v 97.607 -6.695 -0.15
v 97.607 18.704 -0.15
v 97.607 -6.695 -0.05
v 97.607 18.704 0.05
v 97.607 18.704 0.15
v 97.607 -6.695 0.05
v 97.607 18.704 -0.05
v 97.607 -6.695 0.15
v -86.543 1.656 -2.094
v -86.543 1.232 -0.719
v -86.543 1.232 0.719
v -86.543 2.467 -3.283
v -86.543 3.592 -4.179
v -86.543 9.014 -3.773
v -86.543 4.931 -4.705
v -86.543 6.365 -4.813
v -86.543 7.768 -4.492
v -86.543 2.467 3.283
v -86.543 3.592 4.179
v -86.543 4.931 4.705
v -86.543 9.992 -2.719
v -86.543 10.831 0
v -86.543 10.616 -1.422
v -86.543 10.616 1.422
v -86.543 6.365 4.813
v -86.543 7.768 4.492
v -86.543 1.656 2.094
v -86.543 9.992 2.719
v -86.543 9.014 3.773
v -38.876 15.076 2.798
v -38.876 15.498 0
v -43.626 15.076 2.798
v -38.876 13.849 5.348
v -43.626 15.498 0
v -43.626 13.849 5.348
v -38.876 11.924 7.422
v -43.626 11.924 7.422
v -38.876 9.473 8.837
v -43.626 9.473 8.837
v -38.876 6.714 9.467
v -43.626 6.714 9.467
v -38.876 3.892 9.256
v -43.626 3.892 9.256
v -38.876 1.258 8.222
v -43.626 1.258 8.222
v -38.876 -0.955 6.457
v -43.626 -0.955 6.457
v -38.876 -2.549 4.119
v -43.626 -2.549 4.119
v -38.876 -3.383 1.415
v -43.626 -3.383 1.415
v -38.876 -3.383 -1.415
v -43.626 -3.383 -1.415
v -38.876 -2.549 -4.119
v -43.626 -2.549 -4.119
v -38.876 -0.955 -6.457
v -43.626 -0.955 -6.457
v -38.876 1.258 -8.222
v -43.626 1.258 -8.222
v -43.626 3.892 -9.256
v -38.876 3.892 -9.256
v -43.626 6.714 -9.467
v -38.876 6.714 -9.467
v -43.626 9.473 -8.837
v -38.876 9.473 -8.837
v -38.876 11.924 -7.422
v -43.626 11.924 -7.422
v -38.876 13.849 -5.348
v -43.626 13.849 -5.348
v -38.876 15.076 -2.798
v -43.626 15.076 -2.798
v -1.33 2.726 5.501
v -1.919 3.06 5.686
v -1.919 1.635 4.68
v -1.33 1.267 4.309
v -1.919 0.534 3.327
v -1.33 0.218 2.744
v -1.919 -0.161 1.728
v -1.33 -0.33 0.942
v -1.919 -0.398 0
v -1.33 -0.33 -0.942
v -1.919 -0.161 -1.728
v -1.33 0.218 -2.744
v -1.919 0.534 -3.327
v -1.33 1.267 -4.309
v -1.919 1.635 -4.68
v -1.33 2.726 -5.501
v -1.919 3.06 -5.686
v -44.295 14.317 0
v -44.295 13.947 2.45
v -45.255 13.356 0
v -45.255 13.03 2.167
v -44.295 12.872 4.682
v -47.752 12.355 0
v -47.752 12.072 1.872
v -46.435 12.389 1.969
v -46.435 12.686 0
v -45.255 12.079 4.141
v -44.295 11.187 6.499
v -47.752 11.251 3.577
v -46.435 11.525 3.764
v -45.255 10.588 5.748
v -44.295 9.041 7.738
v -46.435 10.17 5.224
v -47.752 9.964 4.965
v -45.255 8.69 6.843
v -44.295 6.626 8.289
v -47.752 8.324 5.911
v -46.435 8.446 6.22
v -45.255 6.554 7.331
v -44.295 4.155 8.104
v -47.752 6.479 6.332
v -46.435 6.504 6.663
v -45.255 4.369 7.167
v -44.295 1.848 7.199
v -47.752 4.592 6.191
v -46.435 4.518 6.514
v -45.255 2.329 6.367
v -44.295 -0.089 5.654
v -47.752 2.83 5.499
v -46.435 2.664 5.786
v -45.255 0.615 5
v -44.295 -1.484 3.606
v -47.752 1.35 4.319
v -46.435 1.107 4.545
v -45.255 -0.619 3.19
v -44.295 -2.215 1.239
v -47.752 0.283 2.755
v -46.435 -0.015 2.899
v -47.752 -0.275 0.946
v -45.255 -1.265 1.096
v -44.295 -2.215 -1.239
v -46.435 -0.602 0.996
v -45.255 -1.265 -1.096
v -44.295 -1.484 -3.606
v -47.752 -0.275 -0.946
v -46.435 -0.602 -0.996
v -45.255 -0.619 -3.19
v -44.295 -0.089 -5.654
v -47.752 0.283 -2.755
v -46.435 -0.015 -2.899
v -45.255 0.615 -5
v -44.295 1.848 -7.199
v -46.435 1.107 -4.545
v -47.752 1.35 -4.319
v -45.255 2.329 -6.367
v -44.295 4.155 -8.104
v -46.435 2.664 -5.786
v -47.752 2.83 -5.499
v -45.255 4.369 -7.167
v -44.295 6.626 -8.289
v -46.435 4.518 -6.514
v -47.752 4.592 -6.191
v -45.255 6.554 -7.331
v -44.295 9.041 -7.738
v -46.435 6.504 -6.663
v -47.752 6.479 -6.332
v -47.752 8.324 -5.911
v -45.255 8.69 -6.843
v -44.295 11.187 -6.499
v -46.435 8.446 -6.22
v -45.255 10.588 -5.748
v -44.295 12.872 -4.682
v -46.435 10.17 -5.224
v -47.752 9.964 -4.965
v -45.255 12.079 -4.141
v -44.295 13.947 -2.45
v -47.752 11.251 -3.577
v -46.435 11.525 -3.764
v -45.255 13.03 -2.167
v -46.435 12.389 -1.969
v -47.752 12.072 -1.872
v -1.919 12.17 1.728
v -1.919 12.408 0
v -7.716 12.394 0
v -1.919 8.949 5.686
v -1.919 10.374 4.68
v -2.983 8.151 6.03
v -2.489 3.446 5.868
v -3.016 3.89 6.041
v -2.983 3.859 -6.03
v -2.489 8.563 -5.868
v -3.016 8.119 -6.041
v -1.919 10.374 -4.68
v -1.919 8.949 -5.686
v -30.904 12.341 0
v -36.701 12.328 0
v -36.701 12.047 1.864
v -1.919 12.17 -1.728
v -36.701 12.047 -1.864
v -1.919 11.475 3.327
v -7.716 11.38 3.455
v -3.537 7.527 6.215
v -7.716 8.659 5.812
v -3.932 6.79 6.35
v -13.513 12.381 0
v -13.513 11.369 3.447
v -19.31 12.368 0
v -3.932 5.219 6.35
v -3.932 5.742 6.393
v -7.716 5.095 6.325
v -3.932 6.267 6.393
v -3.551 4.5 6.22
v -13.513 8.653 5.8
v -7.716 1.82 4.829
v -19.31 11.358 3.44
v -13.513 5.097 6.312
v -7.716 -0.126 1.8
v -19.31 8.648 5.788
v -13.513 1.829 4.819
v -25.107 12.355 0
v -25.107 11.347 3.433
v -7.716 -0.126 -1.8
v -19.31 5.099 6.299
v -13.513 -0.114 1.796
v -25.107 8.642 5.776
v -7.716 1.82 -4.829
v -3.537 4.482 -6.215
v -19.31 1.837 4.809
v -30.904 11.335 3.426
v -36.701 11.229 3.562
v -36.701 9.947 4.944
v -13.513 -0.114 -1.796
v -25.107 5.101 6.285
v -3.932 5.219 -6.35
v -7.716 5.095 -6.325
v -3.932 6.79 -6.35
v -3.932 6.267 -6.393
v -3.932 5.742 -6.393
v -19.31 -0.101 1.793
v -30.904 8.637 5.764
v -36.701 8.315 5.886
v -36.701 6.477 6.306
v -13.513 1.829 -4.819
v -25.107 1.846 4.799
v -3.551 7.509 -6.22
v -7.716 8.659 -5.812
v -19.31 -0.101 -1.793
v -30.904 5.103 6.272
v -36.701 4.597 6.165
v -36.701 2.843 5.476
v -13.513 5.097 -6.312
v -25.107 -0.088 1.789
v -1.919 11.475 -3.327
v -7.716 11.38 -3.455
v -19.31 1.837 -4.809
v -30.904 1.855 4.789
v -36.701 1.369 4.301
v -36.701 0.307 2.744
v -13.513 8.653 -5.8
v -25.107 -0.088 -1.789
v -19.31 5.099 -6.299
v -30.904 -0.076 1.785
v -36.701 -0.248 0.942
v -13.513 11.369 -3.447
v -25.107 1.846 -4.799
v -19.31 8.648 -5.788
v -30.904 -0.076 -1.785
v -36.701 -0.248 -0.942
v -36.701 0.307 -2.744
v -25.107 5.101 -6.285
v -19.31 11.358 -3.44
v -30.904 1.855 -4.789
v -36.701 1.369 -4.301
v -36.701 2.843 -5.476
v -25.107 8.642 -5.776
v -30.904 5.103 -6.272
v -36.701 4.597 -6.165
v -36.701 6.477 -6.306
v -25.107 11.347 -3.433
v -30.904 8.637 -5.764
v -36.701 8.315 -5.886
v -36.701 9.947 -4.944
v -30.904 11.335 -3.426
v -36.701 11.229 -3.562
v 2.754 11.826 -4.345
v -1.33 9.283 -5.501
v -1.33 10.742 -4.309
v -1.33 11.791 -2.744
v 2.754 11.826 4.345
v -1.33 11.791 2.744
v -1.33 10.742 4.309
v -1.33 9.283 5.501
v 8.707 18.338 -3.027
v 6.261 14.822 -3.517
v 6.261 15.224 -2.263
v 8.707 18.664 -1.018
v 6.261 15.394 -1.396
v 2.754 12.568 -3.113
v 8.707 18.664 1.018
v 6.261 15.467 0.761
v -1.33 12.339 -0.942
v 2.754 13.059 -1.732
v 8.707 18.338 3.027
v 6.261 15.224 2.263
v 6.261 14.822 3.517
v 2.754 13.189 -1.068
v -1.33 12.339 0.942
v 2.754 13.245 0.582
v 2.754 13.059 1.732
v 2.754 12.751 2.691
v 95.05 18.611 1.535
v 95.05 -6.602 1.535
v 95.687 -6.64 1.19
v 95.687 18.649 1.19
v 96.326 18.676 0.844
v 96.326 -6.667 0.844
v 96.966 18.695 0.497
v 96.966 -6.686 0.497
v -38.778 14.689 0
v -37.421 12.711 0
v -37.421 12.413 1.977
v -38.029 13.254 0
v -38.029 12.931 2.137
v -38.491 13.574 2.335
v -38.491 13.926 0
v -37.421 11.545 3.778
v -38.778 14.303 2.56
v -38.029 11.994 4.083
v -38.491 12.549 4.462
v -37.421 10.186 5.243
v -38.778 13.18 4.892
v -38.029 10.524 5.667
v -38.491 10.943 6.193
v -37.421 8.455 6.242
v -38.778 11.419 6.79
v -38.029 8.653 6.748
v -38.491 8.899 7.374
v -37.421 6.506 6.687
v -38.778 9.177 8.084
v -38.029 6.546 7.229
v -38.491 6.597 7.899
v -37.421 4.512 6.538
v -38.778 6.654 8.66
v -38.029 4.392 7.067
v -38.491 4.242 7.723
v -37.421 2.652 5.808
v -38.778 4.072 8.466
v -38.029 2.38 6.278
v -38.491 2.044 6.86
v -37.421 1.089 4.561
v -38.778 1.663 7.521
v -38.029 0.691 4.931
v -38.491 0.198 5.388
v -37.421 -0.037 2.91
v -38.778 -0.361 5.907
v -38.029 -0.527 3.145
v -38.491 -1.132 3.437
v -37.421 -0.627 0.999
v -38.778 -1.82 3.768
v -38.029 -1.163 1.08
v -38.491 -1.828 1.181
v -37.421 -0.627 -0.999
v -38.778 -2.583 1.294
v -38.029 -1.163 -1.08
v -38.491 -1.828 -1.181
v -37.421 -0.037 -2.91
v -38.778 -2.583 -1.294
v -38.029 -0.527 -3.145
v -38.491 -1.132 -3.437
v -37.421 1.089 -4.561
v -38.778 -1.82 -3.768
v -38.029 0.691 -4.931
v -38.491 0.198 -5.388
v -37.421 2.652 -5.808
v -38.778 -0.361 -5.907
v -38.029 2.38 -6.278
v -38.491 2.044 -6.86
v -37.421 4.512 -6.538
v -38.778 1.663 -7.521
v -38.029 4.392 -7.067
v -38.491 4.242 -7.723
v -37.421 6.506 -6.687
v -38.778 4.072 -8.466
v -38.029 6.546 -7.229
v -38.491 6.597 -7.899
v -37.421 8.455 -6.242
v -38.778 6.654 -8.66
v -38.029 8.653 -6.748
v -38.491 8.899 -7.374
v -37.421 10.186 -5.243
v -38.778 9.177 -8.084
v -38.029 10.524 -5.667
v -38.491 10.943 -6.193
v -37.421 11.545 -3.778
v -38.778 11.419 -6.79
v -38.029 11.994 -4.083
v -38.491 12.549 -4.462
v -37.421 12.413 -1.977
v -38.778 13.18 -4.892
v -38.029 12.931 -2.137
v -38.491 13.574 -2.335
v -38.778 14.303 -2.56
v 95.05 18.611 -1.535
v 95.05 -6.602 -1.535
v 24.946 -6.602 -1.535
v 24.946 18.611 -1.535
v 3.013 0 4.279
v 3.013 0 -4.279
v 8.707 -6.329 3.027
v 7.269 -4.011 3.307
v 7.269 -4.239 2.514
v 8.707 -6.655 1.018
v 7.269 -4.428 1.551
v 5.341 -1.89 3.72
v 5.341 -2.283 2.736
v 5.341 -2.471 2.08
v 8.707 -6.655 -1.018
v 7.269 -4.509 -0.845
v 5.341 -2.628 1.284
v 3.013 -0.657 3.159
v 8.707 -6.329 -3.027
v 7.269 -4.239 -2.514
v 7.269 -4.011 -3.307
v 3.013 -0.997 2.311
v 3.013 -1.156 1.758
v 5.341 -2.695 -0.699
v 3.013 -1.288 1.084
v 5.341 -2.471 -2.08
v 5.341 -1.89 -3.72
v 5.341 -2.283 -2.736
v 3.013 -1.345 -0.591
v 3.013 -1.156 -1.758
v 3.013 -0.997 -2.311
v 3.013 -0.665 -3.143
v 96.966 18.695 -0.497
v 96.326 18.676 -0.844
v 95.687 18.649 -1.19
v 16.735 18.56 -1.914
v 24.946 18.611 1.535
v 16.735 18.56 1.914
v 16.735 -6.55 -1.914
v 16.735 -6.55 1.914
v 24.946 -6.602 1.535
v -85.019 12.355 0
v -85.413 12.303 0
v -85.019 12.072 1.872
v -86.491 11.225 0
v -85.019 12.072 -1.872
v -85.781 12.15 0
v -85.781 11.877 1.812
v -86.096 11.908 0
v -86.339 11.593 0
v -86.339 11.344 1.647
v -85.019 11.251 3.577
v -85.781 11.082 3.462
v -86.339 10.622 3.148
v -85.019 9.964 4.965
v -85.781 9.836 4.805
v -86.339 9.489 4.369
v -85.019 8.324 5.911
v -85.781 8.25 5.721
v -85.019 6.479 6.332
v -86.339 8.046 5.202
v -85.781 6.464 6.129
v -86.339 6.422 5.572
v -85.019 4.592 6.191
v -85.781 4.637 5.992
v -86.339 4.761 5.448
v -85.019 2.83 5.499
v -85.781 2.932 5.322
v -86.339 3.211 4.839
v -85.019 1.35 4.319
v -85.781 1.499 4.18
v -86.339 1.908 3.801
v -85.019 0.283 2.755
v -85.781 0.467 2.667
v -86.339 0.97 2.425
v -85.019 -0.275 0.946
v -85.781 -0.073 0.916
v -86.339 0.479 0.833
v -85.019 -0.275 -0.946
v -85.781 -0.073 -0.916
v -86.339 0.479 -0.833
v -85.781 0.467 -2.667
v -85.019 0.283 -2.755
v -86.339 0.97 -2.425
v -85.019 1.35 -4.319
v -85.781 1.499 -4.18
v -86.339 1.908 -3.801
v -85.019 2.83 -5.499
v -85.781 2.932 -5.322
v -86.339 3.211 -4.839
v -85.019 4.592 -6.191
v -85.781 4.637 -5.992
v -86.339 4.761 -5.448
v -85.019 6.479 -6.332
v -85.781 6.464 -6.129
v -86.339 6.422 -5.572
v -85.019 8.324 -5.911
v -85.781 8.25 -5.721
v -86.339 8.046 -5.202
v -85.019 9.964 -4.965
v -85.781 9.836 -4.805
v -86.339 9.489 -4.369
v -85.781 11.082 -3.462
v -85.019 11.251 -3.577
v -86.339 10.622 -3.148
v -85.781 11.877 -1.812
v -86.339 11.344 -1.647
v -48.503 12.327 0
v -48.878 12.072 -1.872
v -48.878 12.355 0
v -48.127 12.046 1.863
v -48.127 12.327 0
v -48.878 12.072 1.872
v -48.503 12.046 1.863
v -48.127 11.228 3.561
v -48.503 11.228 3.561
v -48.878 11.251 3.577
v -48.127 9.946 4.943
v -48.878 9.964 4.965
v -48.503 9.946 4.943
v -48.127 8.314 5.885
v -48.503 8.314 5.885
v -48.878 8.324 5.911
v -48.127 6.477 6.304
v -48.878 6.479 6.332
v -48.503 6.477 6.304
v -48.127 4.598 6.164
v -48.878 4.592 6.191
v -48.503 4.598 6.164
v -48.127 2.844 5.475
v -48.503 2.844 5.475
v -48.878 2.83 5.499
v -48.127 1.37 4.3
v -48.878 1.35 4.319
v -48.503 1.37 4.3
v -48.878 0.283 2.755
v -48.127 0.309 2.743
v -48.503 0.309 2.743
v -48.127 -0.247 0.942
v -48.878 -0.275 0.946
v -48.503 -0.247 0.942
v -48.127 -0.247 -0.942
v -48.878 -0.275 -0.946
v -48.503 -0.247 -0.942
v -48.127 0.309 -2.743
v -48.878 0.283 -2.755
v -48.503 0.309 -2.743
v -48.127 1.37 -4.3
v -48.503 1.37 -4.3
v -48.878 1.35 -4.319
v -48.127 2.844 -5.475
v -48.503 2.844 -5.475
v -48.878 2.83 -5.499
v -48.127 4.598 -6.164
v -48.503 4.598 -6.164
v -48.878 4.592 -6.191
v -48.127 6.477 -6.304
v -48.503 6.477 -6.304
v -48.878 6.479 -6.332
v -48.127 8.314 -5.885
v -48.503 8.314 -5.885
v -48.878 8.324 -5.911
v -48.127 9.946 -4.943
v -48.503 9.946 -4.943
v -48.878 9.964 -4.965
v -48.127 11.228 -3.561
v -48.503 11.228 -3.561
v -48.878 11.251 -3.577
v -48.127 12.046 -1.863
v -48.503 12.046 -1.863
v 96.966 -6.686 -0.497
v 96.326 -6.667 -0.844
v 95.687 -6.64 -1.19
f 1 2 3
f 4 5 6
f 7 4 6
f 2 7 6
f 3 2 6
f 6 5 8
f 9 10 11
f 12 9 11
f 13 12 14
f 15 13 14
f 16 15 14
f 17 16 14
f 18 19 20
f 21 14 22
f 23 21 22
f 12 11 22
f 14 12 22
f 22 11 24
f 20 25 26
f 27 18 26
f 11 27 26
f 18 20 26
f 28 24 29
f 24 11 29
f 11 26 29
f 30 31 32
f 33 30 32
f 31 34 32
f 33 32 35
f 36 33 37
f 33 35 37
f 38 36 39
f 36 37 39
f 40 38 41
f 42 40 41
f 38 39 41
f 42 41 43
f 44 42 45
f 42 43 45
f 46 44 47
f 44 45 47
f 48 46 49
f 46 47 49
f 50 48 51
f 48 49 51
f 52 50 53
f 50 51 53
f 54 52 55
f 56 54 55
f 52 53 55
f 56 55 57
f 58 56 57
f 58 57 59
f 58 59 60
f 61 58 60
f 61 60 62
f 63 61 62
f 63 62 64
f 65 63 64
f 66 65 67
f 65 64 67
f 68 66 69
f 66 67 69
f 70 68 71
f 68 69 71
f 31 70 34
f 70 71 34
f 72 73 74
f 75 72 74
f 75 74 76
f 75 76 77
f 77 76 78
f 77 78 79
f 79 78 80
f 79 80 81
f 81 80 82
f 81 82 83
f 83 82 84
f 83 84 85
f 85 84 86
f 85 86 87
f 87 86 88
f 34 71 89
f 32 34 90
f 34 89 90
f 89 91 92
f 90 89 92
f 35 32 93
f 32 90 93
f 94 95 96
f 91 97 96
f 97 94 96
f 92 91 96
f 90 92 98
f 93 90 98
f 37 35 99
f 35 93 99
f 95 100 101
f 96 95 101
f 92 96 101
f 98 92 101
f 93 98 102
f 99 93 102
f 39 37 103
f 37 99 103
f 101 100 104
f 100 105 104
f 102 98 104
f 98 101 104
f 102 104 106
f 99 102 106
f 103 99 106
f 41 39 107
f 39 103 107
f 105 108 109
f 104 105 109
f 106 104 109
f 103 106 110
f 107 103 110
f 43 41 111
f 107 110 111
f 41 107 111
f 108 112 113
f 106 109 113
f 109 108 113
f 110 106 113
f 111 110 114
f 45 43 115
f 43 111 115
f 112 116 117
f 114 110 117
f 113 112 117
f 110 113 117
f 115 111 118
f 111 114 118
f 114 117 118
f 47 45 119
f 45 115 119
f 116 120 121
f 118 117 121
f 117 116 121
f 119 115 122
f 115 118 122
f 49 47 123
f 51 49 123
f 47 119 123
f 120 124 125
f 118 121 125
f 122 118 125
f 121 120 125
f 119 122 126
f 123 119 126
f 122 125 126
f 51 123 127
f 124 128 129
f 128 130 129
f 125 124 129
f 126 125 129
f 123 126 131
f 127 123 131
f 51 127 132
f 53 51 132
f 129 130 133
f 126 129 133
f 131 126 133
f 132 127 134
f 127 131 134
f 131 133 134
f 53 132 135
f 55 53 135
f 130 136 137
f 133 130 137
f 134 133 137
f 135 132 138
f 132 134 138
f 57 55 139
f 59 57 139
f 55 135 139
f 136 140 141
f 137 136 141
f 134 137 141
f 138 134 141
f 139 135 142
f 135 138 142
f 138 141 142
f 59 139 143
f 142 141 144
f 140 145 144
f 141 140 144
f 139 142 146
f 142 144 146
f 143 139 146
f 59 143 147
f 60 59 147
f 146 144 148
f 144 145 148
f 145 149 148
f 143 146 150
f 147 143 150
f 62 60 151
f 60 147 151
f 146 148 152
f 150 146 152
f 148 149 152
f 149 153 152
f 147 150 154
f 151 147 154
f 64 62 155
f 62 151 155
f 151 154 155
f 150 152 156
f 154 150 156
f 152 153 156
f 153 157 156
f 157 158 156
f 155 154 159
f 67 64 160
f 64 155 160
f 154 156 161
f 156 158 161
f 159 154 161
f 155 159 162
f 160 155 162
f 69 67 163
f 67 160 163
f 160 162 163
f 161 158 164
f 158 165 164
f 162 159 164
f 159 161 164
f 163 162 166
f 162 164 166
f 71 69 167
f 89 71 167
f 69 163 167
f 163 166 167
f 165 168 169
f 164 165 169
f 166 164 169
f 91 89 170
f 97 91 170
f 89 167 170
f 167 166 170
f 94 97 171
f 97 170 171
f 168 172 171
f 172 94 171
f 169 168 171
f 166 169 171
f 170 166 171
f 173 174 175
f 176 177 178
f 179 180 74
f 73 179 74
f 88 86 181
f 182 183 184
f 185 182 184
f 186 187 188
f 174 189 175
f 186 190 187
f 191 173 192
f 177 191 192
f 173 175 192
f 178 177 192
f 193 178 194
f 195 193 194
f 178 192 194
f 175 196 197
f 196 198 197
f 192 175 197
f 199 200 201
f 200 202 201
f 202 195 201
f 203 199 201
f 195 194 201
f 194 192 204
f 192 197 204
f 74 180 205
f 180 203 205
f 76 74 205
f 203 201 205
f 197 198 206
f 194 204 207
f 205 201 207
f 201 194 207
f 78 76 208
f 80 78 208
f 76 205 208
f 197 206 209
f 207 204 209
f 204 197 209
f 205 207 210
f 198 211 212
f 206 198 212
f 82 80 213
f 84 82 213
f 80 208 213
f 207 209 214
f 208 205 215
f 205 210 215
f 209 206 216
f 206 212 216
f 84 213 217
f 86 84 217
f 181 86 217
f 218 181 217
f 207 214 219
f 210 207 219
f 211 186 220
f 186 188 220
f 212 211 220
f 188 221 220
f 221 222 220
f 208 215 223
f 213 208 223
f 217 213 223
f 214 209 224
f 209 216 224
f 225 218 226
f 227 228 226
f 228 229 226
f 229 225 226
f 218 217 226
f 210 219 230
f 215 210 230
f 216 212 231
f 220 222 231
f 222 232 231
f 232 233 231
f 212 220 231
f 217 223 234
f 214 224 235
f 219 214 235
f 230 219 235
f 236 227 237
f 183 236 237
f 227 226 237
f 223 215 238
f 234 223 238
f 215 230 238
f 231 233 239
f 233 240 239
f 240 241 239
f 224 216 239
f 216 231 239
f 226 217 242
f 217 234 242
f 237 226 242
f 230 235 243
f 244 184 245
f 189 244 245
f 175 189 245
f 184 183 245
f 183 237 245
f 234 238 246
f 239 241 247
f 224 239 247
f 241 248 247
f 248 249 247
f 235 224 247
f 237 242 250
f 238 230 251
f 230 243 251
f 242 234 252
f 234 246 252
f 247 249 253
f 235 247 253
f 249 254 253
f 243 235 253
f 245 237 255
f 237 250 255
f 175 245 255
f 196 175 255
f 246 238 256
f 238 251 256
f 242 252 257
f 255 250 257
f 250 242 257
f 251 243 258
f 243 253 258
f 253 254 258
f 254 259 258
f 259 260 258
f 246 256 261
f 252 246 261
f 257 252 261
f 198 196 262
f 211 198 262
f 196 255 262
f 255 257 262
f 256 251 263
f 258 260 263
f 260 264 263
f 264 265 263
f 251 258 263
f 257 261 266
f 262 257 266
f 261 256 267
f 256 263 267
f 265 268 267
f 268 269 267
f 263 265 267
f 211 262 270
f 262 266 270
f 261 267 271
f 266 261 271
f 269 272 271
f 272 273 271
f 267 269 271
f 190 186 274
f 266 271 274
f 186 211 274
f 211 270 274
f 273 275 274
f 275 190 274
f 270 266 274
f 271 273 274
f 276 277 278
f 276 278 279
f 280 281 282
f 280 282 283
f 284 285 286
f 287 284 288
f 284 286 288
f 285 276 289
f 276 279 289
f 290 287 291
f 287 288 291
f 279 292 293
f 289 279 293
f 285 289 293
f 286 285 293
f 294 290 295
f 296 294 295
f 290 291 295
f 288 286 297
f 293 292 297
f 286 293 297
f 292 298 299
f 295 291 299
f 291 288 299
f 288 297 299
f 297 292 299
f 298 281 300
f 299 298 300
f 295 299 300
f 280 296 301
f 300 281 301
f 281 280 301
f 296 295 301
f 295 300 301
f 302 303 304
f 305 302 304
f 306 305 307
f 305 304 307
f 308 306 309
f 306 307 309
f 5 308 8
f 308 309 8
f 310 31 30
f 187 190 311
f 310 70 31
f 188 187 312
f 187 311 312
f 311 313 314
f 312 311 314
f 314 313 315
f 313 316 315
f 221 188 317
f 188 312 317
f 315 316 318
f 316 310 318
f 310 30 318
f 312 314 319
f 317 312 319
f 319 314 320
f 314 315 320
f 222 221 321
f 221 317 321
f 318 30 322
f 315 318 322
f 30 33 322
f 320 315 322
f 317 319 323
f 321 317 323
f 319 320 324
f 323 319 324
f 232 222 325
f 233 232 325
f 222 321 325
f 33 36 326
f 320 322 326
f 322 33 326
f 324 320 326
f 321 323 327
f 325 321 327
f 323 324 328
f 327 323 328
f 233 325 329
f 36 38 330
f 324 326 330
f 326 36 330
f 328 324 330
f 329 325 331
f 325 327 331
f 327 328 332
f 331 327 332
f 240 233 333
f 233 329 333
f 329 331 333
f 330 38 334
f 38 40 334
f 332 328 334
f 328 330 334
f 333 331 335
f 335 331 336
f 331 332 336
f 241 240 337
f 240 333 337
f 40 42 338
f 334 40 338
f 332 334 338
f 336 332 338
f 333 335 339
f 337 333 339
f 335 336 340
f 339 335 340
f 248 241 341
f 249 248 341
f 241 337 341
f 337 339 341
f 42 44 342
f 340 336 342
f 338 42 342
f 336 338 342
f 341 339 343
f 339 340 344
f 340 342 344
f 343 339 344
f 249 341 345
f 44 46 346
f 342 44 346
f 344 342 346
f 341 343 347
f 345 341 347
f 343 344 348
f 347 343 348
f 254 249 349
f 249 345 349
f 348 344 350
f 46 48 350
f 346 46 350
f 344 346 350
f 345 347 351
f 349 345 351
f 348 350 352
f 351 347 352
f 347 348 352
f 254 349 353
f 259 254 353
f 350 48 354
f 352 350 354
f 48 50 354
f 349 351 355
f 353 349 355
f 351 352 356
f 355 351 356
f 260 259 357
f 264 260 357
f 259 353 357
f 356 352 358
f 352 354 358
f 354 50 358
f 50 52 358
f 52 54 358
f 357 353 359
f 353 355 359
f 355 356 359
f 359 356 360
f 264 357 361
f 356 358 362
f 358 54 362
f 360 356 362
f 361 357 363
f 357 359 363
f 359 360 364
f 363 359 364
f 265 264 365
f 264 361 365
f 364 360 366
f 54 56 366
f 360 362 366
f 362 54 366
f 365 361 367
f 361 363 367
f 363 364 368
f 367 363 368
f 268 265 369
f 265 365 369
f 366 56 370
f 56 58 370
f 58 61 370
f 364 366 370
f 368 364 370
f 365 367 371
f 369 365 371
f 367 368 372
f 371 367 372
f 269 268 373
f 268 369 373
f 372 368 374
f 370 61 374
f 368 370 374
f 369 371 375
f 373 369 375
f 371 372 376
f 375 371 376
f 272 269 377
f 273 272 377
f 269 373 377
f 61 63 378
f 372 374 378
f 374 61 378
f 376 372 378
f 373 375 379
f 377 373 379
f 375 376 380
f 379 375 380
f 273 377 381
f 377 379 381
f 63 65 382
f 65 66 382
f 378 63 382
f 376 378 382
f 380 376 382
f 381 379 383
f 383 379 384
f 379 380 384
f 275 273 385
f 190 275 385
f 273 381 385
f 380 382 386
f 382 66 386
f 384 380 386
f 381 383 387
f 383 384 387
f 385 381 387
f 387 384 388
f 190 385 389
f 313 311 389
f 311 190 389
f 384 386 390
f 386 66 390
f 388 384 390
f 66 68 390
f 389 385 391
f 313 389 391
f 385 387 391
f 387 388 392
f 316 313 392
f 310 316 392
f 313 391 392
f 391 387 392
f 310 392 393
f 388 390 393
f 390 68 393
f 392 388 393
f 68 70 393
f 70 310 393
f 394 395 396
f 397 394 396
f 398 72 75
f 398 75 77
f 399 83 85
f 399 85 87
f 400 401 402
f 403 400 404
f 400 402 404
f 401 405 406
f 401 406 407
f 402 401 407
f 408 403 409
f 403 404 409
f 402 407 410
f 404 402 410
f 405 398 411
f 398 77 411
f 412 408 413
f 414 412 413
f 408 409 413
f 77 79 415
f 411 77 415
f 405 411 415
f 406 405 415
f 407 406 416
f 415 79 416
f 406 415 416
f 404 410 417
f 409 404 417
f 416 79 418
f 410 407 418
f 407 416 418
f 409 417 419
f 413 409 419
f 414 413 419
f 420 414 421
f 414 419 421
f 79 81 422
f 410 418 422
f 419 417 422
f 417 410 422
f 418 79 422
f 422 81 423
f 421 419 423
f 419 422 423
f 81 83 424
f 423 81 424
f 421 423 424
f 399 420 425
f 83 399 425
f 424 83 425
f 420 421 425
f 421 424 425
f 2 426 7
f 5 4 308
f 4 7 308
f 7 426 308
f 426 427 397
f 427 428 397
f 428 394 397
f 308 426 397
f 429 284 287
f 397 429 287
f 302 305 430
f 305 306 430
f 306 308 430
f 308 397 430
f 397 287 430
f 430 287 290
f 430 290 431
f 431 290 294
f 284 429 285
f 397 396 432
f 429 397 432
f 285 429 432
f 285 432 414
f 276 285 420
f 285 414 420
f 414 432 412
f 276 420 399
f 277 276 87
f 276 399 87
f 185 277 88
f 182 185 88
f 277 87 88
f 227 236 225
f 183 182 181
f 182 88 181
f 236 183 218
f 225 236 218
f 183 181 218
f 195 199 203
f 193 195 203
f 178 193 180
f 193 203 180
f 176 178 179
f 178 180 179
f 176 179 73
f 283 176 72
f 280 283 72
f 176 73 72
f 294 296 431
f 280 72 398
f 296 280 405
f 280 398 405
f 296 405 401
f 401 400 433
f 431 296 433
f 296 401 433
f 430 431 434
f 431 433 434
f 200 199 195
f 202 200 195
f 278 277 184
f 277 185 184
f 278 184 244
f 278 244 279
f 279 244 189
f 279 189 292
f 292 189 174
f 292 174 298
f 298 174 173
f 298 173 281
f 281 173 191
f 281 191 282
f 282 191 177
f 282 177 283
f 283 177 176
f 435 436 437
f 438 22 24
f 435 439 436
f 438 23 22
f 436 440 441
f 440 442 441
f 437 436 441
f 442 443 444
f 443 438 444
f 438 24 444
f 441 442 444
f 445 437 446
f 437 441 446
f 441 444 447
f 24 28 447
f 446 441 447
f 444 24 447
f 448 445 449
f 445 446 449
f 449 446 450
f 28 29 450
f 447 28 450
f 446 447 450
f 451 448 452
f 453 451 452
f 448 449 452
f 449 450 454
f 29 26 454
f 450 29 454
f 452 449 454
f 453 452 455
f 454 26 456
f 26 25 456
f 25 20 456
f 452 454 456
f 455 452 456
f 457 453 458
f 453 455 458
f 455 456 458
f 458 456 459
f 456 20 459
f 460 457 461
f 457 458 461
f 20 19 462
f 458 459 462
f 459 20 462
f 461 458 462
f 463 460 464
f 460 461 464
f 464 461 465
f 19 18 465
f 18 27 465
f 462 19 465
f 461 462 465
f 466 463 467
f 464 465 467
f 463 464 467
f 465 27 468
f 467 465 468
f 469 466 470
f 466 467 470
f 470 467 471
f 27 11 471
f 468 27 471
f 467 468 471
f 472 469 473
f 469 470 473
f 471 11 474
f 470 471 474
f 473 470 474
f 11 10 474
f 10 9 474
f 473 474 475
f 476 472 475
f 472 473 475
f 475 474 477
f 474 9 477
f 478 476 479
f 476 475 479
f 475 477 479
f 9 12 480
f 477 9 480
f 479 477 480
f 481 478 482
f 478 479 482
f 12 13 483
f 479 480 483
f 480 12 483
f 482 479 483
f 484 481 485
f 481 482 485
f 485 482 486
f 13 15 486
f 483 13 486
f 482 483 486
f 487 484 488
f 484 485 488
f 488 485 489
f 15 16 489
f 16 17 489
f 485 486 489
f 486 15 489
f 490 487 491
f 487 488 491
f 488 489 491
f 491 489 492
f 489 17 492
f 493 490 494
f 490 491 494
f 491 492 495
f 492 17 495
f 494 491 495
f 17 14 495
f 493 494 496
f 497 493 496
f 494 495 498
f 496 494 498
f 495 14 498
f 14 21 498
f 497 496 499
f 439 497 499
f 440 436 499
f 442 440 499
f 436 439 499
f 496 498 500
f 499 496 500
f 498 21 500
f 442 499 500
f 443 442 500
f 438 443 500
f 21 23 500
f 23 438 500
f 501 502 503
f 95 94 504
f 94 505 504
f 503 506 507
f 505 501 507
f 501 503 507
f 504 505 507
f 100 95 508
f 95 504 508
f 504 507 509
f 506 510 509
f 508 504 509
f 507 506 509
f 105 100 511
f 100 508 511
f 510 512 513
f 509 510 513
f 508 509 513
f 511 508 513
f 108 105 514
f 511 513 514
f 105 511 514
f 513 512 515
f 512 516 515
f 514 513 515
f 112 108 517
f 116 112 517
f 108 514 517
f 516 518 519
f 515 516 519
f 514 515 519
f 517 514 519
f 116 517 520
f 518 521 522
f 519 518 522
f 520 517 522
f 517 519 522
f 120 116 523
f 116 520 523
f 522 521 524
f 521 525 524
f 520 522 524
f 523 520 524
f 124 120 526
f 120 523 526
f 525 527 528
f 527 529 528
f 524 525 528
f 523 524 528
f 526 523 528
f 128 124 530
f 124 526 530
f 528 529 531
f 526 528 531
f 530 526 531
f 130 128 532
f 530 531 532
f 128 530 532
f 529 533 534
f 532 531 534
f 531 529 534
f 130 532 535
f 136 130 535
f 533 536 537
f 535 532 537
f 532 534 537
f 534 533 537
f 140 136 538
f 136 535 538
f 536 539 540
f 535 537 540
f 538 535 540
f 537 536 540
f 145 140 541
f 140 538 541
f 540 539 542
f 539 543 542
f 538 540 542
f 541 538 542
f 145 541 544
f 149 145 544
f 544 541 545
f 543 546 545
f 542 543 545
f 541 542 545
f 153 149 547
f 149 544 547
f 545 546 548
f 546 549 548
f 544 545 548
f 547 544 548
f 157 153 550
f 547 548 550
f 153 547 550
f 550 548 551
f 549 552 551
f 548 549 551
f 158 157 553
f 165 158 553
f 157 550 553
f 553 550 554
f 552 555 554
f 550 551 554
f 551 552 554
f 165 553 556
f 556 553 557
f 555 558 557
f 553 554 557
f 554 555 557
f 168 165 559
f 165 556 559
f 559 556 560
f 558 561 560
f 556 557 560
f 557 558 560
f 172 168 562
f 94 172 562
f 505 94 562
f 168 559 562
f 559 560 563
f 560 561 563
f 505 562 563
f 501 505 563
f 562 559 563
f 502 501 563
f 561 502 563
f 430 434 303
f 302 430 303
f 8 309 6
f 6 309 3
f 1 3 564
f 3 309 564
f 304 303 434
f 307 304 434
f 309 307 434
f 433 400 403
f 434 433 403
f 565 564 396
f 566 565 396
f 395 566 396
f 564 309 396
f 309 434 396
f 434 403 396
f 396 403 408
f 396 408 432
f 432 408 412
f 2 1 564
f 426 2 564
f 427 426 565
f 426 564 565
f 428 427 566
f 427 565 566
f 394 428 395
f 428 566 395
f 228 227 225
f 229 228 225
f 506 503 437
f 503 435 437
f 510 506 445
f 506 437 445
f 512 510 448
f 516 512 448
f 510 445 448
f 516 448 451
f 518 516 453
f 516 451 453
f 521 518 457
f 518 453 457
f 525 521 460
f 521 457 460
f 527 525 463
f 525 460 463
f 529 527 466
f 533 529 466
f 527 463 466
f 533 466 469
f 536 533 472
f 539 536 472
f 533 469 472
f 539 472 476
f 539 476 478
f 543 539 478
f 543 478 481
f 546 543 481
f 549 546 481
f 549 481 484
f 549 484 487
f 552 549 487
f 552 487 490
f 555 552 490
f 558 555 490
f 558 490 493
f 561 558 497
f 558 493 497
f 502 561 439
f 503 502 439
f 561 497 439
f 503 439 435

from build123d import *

# Parameters (mm, degrees)
F3_DEPTH = 63.5
F4_DEPTH = 25.4


with BuildPart() as f1:
    # F0 (on Top) → F1 (revolve)
    with BuildSketch(Plane.XY):
        with BuildLine():
            Line((-86.542711, 10.830558), (-86.542711, 6.004558))
            Line((-86.542711, 6.004558), (97.607289, 6.004558))
            Line((97.607289, 6.004558), (97.607289, 18.704558))
            Line((97.607289, 18.704558), (8.707289, 18.704558))
            ThreePointArc((8.707289, 18.704558), (4.54759, 14.187595), (-1.329683, 12.408912))
            ThreePointArc((-1.329683, 12.408912), (-1.624219, 12.40452), (-1.918771, 12.407566))
            Line((-1.918771, 12.407566), (-36.700717, 12.328112))
            ThreePointArc((-36.700717, 12.328112), (-38.280061, 13.575768), (-38.876261, 15.498142))
            Line((-38.876261, 15.498142), (-43.626061, 15.498142))
            ThreePointArc((-43.626061, 15.498142), (-45.254669, 13.356142), (-47.75214, 12.354558))
            ThreePointArc((-47.75214, 12.354558), (-48.315292, 12.323061), (-48.878444, 12.354558))
            Line((-48.878444, 12.354558), (-85.018711, 12.354558))
            ThreePointArc((-85.018711, 12.354558), (-86.096341, 11.908189), (-86.542711, 10.830558))
        make_face()
    revolve(axis=Axis((5.532289, 6.004558, 0), (1, 0, 0)))

    # F2 (on Front) → F3 (cut)
    with BuildSketch(Plane.XZ):
        with BuildLine():
            Line((-3.93209, 27.841151), (-3.93209, 6.35))
            ThreePointArc((-3.93209, 6.35), (10.307284, 2.745661), (24.945787, 1.535172))
            Line((24.945787, 1.535172), (95.049836, 1.535172))
            Line((95.049836, 1.535172), (97.884275, 0))
            Line((97.884275, 0), (100.466569, 1.535172))
            Line((100.466569, 1.535172), (113.435097, 10.608604))
            Line((113.435097, 10.608604), (113.435097, 27.841151))
            Line((113.435097, 27.841151), (97.66791, 27.841151))
            Line((97.66791, 27.841151), (-3.93209, 27.841151))
        make_face()
        with BuildLine():
            Line((100.466569, -1.535172), (97.884275, 0))
            Line((97.884275, 0), (95.049836, -1.535172))
            Line((95.049836, -1.535172), (24.945787, -1.535172))
            ThreePointArc((24.945787, -1.535172), (10.307284, -2.745661), (-3.93209, -6.35))
            Line((-3.93209, -6.35), (-3.93209, -27.841151))
            Line((-3.93209, -27.841151), (113.435097, -27.841151))
            Line((113.435097, -27.841151), (113.435097, -10.608604))
            Line((113.435097, -10.608604), (100.466569, -1.535172))
        make_face()
    extrude(amount=-F3_DEPTH, mode=Mode.SUBTRACT)

    # F2 (on Front) → F4 (cut)
    with BuildSketch(Plane.XZ):
        with BuildLine():
            Line((-3.93209, 27.841151), (-3.93209, 6.35))
            ThreePointArc((-3.93209, 6.35), (10.307284, 2.745661), (24.945787, 1.535172))
            Line((24.945787, 1.535172), (95.049836, 1.535172))
            Line((95.049836, 1.535172), (97.884275, 0))
            Line((97.884275, 0), (100.466569, 1.535172))
            Line((100.466569, 1.535172), (113.435097, 10.608604))
            Line((113.435097, 10.608604), (113.435097, 27.841151))
            Line((113.435097, 27.841151), (97.66791, 27.841151))
            Line((97.66791, 27.841151), (-3.93209, 27.841151))
        make_face()
        with BuildLine():
            Line((100.466569, -1.535172), (97.884275, 0))
            Line((97.884275, 0), (95.049836, -1.535172))
            Line((95.049836, -1.535172), (24.945787, -1.535172))
            ThreePointArc((24.945787, -1.535172), (10.307284, -2.745661), (-3.93209, -6.35))
            Line((-3.93209, -6.35), (-3.93209, -27.841151))
            Line((-3.93209, -27.841151), (113.435097, -27.841151))
            Line((113.435097, -27.841151), (113.435097, -10.608604))
            Line((113.435097, -10.608604), (100.466569, -1.535172))
        make_face()
    extrude(amount=F4_DEPTH, mode=Mode.SUBTRACT)


solid = f1.part
